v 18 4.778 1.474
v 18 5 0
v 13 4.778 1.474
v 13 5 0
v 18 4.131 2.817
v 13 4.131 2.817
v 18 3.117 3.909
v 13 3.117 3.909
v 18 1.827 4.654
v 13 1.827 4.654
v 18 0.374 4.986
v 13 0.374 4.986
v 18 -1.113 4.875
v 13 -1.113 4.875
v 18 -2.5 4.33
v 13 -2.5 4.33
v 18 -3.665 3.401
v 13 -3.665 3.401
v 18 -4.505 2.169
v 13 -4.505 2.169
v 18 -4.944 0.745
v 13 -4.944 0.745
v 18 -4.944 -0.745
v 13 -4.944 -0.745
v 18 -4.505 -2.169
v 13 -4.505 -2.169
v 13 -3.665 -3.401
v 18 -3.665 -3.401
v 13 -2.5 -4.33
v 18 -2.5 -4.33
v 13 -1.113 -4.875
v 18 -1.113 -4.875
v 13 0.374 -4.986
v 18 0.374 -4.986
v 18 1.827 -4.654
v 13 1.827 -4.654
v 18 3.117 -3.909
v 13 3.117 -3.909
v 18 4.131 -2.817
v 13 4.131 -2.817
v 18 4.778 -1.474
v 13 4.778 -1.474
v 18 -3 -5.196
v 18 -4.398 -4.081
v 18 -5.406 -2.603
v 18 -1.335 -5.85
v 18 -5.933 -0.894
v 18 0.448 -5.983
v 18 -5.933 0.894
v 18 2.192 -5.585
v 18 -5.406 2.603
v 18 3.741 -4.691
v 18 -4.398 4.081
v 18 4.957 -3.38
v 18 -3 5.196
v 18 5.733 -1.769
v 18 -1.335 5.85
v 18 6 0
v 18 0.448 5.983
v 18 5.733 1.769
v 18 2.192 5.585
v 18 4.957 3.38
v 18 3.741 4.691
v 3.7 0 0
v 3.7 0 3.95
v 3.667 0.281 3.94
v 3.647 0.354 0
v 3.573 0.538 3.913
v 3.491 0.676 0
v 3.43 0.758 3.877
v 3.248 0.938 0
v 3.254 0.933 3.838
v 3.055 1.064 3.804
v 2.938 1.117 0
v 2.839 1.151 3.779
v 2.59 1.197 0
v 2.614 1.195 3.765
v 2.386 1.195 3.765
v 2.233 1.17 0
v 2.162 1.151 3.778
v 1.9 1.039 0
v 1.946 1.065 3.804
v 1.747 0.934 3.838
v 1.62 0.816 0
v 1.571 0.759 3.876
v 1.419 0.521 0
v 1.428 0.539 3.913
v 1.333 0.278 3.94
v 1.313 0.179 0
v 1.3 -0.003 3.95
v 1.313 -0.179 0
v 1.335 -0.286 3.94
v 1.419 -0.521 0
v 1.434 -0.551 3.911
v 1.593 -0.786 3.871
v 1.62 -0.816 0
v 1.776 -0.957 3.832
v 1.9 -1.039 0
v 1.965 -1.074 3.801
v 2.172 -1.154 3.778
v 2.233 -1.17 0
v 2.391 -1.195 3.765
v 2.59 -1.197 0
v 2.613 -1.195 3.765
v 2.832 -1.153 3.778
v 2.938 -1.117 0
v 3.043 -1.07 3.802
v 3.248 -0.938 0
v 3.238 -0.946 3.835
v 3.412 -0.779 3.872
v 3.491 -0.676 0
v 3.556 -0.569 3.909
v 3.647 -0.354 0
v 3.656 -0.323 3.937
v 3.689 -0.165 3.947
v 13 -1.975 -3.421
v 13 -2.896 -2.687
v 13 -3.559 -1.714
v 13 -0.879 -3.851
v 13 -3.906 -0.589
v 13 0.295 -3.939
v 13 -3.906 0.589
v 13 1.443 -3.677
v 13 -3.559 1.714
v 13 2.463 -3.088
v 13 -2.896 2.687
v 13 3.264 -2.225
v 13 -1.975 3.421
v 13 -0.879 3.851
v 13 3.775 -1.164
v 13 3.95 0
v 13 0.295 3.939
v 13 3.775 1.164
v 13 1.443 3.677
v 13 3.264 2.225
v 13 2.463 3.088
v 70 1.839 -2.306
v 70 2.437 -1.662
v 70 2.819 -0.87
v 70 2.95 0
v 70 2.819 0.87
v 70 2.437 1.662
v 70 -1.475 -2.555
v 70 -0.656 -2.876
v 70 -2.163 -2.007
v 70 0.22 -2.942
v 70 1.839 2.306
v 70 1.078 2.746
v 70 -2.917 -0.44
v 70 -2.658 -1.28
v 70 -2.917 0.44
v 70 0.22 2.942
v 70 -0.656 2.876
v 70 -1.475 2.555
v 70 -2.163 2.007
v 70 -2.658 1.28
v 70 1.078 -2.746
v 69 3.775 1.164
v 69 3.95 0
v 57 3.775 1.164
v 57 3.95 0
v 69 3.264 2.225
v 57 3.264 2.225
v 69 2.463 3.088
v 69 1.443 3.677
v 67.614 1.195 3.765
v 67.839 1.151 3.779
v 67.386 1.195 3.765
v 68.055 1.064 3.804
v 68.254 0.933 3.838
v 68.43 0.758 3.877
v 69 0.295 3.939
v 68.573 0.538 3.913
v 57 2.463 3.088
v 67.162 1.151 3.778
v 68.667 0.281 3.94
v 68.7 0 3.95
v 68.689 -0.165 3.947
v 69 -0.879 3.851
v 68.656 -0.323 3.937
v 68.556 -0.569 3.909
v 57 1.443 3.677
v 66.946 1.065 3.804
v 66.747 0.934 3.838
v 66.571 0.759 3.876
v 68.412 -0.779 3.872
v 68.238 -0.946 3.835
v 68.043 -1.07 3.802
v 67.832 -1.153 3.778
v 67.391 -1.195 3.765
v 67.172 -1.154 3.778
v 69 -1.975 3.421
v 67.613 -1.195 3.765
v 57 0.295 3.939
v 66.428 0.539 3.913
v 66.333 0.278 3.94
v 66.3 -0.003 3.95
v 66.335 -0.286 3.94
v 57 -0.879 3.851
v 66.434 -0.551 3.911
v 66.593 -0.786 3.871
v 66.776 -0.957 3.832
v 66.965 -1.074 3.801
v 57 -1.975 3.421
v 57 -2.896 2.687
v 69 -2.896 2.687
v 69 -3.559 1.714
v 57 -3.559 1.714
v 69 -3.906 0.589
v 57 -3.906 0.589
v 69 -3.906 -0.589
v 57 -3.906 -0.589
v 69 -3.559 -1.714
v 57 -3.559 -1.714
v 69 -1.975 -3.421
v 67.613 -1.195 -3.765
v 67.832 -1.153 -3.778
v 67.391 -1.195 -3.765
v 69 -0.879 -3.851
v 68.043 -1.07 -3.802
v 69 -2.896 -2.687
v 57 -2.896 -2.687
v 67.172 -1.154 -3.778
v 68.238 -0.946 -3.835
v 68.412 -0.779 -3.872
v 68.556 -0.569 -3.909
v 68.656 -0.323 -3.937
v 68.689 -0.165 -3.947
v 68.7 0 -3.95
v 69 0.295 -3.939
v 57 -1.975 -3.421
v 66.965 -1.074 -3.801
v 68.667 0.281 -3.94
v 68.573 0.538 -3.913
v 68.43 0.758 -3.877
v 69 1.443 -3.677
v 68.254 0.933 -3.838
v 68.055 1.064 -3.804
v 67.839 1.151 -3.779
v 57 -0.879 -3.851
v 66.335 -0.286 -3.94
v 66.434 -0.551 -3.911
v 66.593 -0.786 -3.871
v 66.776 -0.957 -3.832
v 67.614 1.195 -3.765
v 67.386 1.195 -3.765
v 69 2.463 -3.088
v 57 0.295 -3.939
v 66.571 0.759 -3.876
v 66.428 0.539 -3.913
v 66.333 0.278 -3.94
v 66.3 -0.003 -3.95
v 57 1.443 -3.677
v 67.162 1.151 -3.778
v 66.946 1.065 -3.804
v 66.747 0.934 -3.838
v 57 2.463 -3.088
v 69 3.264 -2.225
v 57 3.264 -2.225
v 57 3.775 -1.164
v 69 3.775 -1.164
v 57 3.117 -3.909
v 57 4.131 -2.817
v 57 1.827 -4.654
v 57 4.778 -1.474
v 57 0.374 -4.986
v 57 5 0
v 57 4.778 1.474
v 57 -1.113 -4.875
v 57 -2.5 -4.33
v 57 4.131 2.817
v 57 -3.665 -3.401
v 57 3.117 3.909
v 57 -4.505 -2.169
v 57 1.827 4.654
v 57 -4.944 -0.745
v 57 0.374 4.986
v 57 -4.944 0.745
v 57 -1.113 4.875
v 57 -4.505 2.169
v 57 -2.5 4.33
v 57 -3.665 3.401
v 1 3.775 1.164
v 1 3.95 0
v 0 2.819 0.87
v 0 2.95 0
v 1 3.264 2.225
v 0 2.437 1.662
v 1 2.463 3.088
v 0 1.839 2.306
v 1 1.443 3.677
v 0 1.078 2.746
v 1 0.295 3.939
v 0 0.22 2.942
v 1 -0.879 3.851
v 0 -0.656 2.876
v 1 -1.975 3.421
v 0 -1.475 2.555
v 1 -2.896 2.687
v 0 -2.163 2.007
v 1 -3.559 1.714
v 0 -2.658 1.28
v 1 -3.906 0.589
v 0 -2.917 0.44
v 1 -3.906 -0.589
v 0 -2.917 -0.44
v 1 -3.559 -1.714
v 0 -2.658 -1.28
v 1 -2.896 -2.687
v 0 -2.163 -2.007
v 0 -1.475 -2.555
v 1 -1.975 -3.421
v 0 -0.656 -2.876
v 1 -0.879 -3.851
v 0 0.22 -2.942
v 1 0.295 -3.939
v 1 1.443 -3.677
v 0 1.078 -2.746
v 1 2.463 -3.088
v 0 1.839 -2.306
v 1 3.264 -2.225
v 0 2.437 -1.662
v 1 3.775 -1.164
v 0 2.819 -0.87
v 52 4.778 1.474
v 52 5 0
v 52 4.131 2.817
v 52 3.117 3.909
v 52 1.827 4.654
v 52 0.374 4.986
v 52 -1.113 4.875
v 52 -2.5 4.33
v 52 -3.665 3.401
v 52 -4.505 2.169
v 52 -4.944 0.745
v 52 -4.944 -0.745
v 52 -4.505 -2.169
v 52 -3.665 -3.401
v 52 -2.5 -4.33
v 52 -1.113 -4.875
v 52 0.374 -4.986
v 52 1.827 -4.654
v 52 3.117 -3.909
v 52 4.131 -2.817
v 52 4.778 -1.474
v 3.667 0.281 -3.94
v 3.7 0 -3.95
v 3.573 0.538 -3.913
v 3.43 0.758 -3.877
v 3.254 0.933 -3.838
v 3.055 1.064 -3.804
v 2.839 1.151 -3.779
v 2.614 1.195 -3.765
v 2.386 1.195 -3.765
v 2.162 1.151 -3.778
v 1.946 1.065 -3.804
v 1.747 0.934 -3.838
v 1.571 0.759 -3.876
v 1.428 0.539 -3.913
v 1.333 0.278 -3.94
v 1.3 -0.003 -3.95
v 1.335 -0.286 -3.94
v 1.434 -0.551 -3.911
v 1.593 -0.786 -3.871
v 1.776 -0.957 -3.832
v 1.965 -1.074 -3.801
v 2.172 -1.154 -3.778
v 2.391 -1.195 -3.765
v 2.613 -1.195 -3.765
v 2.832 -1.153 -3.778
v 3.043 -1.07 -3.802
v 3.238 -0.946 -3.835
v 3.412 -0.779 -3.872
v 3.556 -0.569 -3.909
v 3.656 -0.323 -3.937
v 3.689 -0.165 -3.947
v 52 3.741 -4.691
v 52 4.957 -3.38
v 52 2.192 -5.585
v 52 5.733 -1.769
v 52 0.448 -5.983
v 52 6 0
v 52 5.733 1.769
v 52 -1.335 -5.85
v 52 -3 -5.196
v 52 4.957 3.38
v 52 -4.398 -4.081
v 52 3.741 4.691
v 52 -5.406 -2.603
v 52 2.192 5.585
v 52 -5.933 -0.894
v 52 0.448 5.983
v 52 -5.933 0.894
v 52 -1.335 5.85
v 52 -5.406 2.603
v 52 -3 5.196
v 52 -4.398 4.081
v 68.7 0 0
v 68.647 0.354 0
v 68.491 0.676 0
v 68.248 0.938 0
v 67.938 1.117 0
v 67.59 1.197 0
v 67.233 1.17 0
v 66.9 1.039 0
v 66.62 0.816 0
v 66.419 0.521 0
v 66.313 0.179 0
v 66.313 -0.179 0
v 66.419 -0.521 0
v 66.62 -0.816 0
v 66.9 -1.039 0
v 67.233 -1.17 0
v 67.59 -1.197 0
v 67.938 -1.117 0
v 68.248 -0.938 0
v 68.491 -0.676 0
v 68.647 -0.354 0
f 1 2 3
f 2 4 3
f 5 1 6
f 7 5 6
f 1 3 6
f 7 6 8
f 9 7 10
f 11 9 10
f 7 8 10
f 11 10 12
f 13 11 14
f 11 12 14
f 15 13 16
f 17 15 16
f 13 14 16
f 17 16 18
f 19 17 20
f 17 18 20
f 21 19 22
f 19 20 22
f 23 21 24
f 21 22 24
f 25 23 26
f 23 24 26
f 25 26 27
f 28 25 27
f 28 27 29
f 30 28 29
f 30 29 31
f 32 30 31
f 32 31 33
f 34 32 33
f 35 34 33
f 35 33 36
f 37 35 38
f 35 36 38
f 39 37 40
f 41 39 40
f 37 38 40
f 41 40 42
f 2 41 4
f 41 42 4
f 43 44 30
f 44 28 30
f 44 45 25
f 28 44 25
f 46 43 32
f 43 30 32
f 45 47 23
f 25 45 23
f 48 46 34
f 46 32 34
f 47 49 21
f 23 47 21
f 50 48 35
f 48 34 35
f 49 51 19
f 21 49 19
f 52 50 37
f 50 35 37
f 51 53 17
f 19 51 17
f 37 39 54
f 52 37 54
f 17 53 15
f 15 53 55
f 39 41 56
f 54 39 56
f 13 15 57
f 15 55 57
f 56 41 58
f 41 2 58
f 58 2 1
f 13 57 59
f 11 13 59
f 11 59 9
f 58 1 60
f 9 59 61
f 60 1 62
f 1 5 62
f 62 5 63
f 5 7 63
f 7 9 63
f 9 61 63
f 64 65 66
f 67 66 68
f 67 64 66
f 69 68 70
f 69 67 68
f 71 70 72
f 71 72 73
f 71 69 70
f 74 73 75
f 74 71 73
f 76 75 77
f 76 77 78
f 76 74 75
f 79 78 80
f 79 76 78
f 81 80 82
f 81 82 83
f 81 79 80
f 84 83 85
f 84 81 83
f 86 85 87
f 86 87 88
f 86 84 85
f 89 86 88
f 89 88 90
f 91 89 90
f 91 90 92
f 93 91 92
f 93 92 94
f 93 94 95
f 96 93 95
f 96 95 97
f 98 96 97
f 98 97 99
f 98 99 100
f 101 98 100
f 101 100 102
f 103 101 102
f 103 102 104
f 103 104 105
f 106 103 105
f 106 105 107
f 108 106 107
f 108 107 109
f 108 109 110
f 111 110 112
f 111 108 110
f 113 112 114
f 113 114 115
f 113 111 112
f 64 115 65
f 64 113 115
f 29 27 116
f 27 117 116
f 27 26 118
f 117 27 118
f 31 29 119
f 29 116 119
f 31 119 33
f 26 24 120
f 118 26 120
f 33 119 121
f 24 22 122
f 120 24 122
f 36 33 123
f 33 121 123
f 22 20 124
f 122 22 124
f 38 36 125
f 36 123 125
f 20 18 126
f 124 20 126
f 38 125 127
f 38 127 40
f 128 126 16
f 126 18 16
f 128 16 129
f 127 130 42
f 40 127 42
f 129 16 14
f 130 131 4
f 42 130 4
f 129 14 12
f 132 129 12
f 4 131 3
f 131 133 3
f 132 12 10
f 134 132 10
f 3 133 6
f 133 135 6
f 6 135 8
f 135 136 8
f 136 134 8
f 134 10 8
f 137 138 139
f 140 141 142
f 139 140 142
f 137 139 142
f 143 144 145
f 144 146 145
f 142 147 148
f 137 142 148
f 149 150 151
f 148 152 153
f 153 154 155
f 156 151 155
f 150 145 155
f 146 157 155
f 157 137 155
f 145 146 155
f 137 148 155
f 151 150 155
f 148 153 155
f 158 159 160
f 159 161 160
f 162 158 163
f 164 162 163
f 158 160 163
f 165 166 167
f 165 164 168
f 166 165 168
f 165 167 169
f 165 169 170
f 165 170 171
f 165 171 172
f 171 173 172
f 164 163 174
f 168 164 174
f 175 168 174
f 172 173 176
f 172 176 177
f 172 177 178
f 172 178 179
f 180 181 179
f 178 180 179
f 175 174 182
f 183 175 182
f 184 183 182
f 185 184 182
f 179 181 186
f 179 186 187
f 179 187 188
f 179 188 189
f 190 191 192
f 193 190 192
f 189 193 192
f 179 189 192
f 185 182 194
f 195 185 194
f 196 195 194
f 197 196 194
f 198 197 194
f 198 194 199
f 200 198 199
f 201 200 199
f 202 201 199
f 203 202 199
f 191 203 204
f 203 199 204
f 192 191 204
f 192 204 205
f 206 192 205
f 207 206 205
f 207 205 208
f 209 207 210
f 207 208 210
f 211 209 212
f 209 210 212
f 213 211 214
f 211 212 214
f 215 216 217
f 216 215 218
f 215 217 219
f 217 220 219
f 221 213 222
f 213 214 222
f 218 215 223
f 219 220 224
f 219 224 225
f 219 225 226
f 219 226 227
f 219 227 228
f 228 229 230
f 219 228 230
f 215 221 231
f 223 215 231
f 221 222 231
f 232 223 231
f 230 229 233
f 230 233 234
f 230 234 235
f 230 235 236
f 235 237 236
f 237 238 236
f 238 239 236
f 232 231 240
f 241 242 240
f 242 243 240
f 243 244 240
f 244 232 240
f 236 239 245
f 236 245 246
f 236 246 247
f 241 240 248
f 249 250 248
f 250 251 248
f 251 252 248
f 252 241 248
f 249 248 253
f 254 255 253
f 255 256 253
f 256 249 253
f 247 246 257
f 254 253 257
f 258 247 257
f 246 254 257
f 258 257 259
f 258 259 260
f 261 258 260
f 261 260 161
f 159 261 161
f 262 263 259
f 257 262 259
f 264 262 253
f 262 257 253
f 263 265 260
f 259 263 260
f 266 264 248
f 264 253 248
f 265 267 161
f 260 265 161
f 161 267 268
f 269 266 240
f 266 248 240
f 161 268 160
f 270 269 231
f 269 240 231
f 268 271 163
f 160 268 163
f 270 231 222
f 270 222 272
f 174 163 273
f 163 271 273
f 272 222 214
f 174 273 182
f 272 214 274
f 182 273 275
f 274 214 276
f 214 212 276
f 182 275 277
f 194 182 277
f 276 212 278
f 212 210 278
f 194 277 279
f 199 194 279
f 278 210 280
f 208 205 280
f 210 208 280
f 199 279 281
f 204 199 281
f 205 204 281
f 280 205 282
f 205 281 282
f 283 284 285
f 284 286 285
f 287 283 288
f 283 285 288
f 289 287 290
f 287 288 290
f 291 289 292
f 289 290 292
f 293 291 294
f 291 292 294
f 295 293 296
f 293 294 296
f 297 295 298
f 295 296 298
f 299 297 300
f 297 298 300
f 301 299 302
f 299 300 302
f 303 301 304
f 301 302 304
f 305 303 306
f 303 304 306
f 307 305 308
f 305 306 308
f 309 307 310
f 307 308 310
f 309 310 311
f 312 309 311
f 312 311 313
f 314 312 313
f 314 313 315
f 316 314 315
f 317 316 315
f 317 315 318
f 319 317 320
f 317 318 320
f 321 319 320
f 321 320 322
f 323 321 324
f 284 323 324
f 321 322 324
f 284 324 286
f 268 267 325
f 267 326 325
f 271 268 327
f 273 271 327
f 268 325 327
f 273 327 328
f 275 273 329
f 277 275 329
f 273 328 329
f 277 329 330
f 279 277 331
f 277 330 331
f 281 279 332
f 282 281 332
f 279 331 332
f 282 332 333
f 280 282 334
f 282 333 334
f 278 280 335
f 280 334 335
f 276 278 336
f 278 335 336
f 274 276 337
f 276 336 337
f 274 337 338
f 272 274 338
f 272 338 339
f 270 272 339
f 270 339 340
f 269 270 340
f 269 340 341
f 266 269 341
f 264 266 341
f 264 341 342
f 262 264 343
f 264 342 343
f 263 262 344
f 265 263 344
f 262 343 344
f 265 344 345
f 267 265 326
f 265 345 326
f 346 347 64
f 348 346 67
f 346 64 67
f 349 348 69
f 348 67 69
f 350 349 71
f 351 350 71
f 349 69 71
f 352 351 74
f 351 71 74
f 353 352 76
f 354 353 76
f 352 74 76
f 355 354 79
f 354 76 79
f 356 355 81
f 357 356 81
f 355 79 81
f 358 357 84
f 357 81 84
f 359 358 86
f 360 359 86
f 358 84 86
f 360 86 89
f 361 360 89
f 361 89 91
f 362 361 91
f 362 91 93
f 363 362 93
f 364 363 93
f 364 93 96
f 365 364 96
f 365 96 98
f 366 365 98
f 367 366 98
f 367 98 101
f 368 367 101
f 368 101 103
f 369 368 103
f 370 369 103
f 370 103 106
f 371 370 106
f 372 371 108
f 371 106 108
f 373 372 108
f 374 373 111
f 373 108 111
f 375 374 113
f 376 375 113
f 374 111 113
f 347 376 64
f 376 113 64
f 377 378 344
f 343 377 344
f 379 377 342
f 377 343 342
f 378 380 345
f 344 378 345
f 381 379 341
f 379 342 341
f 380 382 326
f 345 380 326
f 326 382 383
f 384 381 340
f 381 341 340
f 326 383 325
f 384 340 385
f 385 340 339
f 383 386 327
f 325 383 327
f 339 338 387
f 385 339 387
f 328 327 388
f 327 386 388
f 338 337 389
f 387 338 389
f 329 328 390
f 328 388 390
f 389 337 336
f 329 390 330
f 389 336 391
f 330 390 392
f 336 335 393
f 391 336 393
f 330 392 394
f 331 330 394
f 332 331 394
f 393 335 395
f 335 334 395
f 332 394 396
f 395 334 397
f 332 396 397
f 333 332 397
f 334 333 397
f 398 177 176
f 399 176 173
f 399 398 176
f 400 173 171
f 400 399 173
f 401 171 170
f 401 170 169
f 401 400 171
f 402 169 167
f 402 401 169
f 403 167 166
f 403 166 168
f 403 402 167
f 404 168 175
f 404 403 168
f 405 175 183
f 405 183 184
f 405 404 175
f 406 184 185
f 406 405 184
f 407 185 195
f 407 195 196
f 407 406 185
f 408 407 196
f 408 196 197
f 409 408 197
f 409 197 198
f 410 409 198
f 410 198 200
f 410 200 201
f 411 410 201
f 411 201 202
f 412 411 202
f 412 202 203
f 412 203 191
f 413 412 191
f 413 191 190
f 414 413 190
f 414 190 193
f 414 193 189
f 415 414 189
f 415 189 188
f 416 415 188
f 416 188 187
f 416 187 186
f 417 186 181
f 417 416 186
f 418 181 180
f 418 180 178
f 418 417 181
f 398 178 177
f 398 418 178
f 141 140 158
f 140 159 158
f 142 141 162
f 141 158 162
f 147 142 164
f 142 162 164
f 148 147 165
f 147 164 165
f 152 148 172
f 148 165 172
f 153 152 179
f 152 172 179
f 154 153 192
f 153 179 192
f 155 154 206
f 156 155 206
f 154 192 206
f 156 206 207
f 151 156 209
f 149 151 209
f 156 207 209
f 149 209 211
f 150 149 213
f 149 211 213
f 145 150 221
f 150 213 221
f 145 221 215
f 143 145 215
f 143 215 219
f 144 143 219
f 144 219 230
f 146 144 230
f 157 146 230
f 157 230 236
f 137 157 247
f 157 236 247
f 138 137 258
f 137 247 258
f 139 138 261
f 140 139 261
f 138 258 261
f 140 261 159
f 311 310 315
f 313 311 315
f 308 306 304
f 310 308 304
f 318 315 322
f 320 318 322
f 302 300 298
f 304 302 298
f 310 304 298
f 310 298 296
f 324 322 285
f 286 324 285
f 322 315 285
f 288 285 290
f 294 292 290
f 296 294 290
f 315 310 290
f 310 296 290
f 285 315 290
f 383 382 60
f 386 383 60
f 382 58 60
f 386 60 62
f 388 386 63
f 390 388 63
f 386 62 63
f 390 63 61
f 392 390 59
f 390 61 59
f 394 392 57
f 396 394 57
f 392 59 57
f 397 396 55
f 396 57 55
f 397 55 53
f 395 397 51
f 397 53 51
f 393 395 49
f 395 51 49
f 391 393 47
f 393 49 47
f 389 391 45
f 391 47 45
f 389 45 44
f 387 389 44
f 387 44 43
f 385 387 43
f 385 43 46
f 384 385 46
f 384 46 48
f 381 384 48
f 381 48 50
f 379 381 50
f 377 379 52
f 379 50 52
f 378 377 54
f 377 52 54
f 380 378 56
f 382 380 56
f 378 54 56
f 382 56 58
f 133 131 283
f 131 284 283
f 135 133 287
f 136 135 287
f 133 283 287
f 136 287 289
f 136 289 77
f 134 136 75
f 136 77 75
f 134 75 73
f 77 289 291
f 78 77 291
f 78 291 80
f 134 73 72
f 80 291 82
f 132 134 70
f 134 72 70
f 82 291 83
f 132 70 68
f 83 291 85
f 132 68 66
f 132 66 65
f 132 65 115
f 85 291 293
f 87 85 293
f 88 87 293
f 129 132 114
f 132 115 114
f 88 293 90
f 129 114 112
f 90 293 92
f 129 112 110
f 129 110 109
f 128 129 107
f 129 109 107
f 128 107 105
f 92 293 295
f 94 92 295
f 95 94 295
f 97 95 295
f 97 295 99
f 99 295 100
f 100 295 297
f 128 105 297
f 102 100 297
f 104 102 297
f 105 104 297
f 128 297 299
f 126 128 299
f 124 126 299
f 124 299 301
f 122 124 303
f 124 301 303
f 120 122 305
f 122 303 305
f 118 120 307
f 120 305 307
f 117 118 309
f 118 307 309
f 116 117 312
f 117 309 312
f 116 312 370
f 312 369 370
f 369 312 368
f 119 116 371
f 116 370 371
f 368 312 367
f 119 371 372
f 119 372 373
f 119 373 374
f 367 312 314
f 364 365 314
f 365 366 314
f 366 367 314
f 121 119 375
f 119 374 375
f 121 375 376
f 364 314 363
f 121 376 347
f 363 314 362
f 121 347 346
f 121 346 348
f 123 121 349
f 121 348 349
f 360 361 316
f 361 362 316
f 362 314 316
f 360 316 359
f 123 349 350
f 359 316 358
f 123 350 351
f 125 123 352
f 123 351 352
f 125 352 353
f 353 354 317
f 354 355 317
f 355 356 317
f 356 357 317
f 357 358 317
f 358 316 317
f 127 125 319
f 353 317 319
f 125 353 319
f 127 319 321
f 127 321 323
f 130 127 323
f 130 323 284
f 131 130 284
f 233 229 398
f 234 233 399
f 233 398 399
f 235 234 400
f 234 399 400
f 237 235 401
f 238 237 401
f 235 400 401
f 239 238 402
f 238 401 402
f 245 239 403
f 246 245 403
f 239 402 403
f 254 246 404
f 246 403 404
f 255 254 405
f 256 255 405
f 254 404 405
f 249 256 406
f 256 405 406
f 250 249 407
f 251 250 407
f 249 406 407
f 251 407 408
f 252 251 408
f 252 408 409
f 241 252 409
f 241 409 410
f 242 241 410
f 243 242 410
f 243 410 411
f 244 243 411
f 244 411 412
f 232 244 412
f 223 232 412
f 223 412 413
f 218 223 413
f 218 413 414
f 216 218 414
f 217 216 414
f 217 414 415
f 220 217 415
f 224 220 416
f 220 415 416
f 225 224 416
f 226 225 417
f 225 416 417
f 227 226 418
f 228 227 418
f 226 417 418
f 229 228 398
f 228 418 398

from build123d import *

# Parameters (mm, degrees)
SZKIC2_R                        = 1.2
WYTNIJ_WYCI_GNI_CIE1_DEPTH      = 7
WYTNIJ_WYCI_GNI_CIE1_DEPTH_BACK = 7


with BuildPart() as part:
    # Szkic1 → Obrót1 (revolve)
    with BuildSketch(Plane.XY):
        Polygon((0, 0), (70, 0), (70, 2.95), (69, 3.95), (57, 3.95), (57, 5), (52, 5), (52, 6), (18, 6), (18, 5), (13, 5), (13, 3.95), (1, 3.95), (0, 2.95), align=None)
    revolve(axis=Axis((0, 0, 0), (1, 0, 0)))

    # Szkic2 → Wytnij-wyciągnięcie1 (cut, two sides)
    with BuildSketch(Plane.XY) as wytnij_wyci_gni_cie1_sk:
        with Locations((67.5, 0)):
            Circle(SZKIC2_R)
        with Locations((2.5, 0)):
            Circle(SZKIC2_R)
    extrude(amount=WYTNIJ_WYCI_GNI_CIE1_DEPTH, mode=Mode.SUBTRACT)
    extrude(wytnij_wyci_gni_cie1_sk.sketch, amount=-WYTNIJ_WYCI_GNI_CIE1_DEPTH_BACK, mode=Mode.SUBTRACT)


solid = part.part
